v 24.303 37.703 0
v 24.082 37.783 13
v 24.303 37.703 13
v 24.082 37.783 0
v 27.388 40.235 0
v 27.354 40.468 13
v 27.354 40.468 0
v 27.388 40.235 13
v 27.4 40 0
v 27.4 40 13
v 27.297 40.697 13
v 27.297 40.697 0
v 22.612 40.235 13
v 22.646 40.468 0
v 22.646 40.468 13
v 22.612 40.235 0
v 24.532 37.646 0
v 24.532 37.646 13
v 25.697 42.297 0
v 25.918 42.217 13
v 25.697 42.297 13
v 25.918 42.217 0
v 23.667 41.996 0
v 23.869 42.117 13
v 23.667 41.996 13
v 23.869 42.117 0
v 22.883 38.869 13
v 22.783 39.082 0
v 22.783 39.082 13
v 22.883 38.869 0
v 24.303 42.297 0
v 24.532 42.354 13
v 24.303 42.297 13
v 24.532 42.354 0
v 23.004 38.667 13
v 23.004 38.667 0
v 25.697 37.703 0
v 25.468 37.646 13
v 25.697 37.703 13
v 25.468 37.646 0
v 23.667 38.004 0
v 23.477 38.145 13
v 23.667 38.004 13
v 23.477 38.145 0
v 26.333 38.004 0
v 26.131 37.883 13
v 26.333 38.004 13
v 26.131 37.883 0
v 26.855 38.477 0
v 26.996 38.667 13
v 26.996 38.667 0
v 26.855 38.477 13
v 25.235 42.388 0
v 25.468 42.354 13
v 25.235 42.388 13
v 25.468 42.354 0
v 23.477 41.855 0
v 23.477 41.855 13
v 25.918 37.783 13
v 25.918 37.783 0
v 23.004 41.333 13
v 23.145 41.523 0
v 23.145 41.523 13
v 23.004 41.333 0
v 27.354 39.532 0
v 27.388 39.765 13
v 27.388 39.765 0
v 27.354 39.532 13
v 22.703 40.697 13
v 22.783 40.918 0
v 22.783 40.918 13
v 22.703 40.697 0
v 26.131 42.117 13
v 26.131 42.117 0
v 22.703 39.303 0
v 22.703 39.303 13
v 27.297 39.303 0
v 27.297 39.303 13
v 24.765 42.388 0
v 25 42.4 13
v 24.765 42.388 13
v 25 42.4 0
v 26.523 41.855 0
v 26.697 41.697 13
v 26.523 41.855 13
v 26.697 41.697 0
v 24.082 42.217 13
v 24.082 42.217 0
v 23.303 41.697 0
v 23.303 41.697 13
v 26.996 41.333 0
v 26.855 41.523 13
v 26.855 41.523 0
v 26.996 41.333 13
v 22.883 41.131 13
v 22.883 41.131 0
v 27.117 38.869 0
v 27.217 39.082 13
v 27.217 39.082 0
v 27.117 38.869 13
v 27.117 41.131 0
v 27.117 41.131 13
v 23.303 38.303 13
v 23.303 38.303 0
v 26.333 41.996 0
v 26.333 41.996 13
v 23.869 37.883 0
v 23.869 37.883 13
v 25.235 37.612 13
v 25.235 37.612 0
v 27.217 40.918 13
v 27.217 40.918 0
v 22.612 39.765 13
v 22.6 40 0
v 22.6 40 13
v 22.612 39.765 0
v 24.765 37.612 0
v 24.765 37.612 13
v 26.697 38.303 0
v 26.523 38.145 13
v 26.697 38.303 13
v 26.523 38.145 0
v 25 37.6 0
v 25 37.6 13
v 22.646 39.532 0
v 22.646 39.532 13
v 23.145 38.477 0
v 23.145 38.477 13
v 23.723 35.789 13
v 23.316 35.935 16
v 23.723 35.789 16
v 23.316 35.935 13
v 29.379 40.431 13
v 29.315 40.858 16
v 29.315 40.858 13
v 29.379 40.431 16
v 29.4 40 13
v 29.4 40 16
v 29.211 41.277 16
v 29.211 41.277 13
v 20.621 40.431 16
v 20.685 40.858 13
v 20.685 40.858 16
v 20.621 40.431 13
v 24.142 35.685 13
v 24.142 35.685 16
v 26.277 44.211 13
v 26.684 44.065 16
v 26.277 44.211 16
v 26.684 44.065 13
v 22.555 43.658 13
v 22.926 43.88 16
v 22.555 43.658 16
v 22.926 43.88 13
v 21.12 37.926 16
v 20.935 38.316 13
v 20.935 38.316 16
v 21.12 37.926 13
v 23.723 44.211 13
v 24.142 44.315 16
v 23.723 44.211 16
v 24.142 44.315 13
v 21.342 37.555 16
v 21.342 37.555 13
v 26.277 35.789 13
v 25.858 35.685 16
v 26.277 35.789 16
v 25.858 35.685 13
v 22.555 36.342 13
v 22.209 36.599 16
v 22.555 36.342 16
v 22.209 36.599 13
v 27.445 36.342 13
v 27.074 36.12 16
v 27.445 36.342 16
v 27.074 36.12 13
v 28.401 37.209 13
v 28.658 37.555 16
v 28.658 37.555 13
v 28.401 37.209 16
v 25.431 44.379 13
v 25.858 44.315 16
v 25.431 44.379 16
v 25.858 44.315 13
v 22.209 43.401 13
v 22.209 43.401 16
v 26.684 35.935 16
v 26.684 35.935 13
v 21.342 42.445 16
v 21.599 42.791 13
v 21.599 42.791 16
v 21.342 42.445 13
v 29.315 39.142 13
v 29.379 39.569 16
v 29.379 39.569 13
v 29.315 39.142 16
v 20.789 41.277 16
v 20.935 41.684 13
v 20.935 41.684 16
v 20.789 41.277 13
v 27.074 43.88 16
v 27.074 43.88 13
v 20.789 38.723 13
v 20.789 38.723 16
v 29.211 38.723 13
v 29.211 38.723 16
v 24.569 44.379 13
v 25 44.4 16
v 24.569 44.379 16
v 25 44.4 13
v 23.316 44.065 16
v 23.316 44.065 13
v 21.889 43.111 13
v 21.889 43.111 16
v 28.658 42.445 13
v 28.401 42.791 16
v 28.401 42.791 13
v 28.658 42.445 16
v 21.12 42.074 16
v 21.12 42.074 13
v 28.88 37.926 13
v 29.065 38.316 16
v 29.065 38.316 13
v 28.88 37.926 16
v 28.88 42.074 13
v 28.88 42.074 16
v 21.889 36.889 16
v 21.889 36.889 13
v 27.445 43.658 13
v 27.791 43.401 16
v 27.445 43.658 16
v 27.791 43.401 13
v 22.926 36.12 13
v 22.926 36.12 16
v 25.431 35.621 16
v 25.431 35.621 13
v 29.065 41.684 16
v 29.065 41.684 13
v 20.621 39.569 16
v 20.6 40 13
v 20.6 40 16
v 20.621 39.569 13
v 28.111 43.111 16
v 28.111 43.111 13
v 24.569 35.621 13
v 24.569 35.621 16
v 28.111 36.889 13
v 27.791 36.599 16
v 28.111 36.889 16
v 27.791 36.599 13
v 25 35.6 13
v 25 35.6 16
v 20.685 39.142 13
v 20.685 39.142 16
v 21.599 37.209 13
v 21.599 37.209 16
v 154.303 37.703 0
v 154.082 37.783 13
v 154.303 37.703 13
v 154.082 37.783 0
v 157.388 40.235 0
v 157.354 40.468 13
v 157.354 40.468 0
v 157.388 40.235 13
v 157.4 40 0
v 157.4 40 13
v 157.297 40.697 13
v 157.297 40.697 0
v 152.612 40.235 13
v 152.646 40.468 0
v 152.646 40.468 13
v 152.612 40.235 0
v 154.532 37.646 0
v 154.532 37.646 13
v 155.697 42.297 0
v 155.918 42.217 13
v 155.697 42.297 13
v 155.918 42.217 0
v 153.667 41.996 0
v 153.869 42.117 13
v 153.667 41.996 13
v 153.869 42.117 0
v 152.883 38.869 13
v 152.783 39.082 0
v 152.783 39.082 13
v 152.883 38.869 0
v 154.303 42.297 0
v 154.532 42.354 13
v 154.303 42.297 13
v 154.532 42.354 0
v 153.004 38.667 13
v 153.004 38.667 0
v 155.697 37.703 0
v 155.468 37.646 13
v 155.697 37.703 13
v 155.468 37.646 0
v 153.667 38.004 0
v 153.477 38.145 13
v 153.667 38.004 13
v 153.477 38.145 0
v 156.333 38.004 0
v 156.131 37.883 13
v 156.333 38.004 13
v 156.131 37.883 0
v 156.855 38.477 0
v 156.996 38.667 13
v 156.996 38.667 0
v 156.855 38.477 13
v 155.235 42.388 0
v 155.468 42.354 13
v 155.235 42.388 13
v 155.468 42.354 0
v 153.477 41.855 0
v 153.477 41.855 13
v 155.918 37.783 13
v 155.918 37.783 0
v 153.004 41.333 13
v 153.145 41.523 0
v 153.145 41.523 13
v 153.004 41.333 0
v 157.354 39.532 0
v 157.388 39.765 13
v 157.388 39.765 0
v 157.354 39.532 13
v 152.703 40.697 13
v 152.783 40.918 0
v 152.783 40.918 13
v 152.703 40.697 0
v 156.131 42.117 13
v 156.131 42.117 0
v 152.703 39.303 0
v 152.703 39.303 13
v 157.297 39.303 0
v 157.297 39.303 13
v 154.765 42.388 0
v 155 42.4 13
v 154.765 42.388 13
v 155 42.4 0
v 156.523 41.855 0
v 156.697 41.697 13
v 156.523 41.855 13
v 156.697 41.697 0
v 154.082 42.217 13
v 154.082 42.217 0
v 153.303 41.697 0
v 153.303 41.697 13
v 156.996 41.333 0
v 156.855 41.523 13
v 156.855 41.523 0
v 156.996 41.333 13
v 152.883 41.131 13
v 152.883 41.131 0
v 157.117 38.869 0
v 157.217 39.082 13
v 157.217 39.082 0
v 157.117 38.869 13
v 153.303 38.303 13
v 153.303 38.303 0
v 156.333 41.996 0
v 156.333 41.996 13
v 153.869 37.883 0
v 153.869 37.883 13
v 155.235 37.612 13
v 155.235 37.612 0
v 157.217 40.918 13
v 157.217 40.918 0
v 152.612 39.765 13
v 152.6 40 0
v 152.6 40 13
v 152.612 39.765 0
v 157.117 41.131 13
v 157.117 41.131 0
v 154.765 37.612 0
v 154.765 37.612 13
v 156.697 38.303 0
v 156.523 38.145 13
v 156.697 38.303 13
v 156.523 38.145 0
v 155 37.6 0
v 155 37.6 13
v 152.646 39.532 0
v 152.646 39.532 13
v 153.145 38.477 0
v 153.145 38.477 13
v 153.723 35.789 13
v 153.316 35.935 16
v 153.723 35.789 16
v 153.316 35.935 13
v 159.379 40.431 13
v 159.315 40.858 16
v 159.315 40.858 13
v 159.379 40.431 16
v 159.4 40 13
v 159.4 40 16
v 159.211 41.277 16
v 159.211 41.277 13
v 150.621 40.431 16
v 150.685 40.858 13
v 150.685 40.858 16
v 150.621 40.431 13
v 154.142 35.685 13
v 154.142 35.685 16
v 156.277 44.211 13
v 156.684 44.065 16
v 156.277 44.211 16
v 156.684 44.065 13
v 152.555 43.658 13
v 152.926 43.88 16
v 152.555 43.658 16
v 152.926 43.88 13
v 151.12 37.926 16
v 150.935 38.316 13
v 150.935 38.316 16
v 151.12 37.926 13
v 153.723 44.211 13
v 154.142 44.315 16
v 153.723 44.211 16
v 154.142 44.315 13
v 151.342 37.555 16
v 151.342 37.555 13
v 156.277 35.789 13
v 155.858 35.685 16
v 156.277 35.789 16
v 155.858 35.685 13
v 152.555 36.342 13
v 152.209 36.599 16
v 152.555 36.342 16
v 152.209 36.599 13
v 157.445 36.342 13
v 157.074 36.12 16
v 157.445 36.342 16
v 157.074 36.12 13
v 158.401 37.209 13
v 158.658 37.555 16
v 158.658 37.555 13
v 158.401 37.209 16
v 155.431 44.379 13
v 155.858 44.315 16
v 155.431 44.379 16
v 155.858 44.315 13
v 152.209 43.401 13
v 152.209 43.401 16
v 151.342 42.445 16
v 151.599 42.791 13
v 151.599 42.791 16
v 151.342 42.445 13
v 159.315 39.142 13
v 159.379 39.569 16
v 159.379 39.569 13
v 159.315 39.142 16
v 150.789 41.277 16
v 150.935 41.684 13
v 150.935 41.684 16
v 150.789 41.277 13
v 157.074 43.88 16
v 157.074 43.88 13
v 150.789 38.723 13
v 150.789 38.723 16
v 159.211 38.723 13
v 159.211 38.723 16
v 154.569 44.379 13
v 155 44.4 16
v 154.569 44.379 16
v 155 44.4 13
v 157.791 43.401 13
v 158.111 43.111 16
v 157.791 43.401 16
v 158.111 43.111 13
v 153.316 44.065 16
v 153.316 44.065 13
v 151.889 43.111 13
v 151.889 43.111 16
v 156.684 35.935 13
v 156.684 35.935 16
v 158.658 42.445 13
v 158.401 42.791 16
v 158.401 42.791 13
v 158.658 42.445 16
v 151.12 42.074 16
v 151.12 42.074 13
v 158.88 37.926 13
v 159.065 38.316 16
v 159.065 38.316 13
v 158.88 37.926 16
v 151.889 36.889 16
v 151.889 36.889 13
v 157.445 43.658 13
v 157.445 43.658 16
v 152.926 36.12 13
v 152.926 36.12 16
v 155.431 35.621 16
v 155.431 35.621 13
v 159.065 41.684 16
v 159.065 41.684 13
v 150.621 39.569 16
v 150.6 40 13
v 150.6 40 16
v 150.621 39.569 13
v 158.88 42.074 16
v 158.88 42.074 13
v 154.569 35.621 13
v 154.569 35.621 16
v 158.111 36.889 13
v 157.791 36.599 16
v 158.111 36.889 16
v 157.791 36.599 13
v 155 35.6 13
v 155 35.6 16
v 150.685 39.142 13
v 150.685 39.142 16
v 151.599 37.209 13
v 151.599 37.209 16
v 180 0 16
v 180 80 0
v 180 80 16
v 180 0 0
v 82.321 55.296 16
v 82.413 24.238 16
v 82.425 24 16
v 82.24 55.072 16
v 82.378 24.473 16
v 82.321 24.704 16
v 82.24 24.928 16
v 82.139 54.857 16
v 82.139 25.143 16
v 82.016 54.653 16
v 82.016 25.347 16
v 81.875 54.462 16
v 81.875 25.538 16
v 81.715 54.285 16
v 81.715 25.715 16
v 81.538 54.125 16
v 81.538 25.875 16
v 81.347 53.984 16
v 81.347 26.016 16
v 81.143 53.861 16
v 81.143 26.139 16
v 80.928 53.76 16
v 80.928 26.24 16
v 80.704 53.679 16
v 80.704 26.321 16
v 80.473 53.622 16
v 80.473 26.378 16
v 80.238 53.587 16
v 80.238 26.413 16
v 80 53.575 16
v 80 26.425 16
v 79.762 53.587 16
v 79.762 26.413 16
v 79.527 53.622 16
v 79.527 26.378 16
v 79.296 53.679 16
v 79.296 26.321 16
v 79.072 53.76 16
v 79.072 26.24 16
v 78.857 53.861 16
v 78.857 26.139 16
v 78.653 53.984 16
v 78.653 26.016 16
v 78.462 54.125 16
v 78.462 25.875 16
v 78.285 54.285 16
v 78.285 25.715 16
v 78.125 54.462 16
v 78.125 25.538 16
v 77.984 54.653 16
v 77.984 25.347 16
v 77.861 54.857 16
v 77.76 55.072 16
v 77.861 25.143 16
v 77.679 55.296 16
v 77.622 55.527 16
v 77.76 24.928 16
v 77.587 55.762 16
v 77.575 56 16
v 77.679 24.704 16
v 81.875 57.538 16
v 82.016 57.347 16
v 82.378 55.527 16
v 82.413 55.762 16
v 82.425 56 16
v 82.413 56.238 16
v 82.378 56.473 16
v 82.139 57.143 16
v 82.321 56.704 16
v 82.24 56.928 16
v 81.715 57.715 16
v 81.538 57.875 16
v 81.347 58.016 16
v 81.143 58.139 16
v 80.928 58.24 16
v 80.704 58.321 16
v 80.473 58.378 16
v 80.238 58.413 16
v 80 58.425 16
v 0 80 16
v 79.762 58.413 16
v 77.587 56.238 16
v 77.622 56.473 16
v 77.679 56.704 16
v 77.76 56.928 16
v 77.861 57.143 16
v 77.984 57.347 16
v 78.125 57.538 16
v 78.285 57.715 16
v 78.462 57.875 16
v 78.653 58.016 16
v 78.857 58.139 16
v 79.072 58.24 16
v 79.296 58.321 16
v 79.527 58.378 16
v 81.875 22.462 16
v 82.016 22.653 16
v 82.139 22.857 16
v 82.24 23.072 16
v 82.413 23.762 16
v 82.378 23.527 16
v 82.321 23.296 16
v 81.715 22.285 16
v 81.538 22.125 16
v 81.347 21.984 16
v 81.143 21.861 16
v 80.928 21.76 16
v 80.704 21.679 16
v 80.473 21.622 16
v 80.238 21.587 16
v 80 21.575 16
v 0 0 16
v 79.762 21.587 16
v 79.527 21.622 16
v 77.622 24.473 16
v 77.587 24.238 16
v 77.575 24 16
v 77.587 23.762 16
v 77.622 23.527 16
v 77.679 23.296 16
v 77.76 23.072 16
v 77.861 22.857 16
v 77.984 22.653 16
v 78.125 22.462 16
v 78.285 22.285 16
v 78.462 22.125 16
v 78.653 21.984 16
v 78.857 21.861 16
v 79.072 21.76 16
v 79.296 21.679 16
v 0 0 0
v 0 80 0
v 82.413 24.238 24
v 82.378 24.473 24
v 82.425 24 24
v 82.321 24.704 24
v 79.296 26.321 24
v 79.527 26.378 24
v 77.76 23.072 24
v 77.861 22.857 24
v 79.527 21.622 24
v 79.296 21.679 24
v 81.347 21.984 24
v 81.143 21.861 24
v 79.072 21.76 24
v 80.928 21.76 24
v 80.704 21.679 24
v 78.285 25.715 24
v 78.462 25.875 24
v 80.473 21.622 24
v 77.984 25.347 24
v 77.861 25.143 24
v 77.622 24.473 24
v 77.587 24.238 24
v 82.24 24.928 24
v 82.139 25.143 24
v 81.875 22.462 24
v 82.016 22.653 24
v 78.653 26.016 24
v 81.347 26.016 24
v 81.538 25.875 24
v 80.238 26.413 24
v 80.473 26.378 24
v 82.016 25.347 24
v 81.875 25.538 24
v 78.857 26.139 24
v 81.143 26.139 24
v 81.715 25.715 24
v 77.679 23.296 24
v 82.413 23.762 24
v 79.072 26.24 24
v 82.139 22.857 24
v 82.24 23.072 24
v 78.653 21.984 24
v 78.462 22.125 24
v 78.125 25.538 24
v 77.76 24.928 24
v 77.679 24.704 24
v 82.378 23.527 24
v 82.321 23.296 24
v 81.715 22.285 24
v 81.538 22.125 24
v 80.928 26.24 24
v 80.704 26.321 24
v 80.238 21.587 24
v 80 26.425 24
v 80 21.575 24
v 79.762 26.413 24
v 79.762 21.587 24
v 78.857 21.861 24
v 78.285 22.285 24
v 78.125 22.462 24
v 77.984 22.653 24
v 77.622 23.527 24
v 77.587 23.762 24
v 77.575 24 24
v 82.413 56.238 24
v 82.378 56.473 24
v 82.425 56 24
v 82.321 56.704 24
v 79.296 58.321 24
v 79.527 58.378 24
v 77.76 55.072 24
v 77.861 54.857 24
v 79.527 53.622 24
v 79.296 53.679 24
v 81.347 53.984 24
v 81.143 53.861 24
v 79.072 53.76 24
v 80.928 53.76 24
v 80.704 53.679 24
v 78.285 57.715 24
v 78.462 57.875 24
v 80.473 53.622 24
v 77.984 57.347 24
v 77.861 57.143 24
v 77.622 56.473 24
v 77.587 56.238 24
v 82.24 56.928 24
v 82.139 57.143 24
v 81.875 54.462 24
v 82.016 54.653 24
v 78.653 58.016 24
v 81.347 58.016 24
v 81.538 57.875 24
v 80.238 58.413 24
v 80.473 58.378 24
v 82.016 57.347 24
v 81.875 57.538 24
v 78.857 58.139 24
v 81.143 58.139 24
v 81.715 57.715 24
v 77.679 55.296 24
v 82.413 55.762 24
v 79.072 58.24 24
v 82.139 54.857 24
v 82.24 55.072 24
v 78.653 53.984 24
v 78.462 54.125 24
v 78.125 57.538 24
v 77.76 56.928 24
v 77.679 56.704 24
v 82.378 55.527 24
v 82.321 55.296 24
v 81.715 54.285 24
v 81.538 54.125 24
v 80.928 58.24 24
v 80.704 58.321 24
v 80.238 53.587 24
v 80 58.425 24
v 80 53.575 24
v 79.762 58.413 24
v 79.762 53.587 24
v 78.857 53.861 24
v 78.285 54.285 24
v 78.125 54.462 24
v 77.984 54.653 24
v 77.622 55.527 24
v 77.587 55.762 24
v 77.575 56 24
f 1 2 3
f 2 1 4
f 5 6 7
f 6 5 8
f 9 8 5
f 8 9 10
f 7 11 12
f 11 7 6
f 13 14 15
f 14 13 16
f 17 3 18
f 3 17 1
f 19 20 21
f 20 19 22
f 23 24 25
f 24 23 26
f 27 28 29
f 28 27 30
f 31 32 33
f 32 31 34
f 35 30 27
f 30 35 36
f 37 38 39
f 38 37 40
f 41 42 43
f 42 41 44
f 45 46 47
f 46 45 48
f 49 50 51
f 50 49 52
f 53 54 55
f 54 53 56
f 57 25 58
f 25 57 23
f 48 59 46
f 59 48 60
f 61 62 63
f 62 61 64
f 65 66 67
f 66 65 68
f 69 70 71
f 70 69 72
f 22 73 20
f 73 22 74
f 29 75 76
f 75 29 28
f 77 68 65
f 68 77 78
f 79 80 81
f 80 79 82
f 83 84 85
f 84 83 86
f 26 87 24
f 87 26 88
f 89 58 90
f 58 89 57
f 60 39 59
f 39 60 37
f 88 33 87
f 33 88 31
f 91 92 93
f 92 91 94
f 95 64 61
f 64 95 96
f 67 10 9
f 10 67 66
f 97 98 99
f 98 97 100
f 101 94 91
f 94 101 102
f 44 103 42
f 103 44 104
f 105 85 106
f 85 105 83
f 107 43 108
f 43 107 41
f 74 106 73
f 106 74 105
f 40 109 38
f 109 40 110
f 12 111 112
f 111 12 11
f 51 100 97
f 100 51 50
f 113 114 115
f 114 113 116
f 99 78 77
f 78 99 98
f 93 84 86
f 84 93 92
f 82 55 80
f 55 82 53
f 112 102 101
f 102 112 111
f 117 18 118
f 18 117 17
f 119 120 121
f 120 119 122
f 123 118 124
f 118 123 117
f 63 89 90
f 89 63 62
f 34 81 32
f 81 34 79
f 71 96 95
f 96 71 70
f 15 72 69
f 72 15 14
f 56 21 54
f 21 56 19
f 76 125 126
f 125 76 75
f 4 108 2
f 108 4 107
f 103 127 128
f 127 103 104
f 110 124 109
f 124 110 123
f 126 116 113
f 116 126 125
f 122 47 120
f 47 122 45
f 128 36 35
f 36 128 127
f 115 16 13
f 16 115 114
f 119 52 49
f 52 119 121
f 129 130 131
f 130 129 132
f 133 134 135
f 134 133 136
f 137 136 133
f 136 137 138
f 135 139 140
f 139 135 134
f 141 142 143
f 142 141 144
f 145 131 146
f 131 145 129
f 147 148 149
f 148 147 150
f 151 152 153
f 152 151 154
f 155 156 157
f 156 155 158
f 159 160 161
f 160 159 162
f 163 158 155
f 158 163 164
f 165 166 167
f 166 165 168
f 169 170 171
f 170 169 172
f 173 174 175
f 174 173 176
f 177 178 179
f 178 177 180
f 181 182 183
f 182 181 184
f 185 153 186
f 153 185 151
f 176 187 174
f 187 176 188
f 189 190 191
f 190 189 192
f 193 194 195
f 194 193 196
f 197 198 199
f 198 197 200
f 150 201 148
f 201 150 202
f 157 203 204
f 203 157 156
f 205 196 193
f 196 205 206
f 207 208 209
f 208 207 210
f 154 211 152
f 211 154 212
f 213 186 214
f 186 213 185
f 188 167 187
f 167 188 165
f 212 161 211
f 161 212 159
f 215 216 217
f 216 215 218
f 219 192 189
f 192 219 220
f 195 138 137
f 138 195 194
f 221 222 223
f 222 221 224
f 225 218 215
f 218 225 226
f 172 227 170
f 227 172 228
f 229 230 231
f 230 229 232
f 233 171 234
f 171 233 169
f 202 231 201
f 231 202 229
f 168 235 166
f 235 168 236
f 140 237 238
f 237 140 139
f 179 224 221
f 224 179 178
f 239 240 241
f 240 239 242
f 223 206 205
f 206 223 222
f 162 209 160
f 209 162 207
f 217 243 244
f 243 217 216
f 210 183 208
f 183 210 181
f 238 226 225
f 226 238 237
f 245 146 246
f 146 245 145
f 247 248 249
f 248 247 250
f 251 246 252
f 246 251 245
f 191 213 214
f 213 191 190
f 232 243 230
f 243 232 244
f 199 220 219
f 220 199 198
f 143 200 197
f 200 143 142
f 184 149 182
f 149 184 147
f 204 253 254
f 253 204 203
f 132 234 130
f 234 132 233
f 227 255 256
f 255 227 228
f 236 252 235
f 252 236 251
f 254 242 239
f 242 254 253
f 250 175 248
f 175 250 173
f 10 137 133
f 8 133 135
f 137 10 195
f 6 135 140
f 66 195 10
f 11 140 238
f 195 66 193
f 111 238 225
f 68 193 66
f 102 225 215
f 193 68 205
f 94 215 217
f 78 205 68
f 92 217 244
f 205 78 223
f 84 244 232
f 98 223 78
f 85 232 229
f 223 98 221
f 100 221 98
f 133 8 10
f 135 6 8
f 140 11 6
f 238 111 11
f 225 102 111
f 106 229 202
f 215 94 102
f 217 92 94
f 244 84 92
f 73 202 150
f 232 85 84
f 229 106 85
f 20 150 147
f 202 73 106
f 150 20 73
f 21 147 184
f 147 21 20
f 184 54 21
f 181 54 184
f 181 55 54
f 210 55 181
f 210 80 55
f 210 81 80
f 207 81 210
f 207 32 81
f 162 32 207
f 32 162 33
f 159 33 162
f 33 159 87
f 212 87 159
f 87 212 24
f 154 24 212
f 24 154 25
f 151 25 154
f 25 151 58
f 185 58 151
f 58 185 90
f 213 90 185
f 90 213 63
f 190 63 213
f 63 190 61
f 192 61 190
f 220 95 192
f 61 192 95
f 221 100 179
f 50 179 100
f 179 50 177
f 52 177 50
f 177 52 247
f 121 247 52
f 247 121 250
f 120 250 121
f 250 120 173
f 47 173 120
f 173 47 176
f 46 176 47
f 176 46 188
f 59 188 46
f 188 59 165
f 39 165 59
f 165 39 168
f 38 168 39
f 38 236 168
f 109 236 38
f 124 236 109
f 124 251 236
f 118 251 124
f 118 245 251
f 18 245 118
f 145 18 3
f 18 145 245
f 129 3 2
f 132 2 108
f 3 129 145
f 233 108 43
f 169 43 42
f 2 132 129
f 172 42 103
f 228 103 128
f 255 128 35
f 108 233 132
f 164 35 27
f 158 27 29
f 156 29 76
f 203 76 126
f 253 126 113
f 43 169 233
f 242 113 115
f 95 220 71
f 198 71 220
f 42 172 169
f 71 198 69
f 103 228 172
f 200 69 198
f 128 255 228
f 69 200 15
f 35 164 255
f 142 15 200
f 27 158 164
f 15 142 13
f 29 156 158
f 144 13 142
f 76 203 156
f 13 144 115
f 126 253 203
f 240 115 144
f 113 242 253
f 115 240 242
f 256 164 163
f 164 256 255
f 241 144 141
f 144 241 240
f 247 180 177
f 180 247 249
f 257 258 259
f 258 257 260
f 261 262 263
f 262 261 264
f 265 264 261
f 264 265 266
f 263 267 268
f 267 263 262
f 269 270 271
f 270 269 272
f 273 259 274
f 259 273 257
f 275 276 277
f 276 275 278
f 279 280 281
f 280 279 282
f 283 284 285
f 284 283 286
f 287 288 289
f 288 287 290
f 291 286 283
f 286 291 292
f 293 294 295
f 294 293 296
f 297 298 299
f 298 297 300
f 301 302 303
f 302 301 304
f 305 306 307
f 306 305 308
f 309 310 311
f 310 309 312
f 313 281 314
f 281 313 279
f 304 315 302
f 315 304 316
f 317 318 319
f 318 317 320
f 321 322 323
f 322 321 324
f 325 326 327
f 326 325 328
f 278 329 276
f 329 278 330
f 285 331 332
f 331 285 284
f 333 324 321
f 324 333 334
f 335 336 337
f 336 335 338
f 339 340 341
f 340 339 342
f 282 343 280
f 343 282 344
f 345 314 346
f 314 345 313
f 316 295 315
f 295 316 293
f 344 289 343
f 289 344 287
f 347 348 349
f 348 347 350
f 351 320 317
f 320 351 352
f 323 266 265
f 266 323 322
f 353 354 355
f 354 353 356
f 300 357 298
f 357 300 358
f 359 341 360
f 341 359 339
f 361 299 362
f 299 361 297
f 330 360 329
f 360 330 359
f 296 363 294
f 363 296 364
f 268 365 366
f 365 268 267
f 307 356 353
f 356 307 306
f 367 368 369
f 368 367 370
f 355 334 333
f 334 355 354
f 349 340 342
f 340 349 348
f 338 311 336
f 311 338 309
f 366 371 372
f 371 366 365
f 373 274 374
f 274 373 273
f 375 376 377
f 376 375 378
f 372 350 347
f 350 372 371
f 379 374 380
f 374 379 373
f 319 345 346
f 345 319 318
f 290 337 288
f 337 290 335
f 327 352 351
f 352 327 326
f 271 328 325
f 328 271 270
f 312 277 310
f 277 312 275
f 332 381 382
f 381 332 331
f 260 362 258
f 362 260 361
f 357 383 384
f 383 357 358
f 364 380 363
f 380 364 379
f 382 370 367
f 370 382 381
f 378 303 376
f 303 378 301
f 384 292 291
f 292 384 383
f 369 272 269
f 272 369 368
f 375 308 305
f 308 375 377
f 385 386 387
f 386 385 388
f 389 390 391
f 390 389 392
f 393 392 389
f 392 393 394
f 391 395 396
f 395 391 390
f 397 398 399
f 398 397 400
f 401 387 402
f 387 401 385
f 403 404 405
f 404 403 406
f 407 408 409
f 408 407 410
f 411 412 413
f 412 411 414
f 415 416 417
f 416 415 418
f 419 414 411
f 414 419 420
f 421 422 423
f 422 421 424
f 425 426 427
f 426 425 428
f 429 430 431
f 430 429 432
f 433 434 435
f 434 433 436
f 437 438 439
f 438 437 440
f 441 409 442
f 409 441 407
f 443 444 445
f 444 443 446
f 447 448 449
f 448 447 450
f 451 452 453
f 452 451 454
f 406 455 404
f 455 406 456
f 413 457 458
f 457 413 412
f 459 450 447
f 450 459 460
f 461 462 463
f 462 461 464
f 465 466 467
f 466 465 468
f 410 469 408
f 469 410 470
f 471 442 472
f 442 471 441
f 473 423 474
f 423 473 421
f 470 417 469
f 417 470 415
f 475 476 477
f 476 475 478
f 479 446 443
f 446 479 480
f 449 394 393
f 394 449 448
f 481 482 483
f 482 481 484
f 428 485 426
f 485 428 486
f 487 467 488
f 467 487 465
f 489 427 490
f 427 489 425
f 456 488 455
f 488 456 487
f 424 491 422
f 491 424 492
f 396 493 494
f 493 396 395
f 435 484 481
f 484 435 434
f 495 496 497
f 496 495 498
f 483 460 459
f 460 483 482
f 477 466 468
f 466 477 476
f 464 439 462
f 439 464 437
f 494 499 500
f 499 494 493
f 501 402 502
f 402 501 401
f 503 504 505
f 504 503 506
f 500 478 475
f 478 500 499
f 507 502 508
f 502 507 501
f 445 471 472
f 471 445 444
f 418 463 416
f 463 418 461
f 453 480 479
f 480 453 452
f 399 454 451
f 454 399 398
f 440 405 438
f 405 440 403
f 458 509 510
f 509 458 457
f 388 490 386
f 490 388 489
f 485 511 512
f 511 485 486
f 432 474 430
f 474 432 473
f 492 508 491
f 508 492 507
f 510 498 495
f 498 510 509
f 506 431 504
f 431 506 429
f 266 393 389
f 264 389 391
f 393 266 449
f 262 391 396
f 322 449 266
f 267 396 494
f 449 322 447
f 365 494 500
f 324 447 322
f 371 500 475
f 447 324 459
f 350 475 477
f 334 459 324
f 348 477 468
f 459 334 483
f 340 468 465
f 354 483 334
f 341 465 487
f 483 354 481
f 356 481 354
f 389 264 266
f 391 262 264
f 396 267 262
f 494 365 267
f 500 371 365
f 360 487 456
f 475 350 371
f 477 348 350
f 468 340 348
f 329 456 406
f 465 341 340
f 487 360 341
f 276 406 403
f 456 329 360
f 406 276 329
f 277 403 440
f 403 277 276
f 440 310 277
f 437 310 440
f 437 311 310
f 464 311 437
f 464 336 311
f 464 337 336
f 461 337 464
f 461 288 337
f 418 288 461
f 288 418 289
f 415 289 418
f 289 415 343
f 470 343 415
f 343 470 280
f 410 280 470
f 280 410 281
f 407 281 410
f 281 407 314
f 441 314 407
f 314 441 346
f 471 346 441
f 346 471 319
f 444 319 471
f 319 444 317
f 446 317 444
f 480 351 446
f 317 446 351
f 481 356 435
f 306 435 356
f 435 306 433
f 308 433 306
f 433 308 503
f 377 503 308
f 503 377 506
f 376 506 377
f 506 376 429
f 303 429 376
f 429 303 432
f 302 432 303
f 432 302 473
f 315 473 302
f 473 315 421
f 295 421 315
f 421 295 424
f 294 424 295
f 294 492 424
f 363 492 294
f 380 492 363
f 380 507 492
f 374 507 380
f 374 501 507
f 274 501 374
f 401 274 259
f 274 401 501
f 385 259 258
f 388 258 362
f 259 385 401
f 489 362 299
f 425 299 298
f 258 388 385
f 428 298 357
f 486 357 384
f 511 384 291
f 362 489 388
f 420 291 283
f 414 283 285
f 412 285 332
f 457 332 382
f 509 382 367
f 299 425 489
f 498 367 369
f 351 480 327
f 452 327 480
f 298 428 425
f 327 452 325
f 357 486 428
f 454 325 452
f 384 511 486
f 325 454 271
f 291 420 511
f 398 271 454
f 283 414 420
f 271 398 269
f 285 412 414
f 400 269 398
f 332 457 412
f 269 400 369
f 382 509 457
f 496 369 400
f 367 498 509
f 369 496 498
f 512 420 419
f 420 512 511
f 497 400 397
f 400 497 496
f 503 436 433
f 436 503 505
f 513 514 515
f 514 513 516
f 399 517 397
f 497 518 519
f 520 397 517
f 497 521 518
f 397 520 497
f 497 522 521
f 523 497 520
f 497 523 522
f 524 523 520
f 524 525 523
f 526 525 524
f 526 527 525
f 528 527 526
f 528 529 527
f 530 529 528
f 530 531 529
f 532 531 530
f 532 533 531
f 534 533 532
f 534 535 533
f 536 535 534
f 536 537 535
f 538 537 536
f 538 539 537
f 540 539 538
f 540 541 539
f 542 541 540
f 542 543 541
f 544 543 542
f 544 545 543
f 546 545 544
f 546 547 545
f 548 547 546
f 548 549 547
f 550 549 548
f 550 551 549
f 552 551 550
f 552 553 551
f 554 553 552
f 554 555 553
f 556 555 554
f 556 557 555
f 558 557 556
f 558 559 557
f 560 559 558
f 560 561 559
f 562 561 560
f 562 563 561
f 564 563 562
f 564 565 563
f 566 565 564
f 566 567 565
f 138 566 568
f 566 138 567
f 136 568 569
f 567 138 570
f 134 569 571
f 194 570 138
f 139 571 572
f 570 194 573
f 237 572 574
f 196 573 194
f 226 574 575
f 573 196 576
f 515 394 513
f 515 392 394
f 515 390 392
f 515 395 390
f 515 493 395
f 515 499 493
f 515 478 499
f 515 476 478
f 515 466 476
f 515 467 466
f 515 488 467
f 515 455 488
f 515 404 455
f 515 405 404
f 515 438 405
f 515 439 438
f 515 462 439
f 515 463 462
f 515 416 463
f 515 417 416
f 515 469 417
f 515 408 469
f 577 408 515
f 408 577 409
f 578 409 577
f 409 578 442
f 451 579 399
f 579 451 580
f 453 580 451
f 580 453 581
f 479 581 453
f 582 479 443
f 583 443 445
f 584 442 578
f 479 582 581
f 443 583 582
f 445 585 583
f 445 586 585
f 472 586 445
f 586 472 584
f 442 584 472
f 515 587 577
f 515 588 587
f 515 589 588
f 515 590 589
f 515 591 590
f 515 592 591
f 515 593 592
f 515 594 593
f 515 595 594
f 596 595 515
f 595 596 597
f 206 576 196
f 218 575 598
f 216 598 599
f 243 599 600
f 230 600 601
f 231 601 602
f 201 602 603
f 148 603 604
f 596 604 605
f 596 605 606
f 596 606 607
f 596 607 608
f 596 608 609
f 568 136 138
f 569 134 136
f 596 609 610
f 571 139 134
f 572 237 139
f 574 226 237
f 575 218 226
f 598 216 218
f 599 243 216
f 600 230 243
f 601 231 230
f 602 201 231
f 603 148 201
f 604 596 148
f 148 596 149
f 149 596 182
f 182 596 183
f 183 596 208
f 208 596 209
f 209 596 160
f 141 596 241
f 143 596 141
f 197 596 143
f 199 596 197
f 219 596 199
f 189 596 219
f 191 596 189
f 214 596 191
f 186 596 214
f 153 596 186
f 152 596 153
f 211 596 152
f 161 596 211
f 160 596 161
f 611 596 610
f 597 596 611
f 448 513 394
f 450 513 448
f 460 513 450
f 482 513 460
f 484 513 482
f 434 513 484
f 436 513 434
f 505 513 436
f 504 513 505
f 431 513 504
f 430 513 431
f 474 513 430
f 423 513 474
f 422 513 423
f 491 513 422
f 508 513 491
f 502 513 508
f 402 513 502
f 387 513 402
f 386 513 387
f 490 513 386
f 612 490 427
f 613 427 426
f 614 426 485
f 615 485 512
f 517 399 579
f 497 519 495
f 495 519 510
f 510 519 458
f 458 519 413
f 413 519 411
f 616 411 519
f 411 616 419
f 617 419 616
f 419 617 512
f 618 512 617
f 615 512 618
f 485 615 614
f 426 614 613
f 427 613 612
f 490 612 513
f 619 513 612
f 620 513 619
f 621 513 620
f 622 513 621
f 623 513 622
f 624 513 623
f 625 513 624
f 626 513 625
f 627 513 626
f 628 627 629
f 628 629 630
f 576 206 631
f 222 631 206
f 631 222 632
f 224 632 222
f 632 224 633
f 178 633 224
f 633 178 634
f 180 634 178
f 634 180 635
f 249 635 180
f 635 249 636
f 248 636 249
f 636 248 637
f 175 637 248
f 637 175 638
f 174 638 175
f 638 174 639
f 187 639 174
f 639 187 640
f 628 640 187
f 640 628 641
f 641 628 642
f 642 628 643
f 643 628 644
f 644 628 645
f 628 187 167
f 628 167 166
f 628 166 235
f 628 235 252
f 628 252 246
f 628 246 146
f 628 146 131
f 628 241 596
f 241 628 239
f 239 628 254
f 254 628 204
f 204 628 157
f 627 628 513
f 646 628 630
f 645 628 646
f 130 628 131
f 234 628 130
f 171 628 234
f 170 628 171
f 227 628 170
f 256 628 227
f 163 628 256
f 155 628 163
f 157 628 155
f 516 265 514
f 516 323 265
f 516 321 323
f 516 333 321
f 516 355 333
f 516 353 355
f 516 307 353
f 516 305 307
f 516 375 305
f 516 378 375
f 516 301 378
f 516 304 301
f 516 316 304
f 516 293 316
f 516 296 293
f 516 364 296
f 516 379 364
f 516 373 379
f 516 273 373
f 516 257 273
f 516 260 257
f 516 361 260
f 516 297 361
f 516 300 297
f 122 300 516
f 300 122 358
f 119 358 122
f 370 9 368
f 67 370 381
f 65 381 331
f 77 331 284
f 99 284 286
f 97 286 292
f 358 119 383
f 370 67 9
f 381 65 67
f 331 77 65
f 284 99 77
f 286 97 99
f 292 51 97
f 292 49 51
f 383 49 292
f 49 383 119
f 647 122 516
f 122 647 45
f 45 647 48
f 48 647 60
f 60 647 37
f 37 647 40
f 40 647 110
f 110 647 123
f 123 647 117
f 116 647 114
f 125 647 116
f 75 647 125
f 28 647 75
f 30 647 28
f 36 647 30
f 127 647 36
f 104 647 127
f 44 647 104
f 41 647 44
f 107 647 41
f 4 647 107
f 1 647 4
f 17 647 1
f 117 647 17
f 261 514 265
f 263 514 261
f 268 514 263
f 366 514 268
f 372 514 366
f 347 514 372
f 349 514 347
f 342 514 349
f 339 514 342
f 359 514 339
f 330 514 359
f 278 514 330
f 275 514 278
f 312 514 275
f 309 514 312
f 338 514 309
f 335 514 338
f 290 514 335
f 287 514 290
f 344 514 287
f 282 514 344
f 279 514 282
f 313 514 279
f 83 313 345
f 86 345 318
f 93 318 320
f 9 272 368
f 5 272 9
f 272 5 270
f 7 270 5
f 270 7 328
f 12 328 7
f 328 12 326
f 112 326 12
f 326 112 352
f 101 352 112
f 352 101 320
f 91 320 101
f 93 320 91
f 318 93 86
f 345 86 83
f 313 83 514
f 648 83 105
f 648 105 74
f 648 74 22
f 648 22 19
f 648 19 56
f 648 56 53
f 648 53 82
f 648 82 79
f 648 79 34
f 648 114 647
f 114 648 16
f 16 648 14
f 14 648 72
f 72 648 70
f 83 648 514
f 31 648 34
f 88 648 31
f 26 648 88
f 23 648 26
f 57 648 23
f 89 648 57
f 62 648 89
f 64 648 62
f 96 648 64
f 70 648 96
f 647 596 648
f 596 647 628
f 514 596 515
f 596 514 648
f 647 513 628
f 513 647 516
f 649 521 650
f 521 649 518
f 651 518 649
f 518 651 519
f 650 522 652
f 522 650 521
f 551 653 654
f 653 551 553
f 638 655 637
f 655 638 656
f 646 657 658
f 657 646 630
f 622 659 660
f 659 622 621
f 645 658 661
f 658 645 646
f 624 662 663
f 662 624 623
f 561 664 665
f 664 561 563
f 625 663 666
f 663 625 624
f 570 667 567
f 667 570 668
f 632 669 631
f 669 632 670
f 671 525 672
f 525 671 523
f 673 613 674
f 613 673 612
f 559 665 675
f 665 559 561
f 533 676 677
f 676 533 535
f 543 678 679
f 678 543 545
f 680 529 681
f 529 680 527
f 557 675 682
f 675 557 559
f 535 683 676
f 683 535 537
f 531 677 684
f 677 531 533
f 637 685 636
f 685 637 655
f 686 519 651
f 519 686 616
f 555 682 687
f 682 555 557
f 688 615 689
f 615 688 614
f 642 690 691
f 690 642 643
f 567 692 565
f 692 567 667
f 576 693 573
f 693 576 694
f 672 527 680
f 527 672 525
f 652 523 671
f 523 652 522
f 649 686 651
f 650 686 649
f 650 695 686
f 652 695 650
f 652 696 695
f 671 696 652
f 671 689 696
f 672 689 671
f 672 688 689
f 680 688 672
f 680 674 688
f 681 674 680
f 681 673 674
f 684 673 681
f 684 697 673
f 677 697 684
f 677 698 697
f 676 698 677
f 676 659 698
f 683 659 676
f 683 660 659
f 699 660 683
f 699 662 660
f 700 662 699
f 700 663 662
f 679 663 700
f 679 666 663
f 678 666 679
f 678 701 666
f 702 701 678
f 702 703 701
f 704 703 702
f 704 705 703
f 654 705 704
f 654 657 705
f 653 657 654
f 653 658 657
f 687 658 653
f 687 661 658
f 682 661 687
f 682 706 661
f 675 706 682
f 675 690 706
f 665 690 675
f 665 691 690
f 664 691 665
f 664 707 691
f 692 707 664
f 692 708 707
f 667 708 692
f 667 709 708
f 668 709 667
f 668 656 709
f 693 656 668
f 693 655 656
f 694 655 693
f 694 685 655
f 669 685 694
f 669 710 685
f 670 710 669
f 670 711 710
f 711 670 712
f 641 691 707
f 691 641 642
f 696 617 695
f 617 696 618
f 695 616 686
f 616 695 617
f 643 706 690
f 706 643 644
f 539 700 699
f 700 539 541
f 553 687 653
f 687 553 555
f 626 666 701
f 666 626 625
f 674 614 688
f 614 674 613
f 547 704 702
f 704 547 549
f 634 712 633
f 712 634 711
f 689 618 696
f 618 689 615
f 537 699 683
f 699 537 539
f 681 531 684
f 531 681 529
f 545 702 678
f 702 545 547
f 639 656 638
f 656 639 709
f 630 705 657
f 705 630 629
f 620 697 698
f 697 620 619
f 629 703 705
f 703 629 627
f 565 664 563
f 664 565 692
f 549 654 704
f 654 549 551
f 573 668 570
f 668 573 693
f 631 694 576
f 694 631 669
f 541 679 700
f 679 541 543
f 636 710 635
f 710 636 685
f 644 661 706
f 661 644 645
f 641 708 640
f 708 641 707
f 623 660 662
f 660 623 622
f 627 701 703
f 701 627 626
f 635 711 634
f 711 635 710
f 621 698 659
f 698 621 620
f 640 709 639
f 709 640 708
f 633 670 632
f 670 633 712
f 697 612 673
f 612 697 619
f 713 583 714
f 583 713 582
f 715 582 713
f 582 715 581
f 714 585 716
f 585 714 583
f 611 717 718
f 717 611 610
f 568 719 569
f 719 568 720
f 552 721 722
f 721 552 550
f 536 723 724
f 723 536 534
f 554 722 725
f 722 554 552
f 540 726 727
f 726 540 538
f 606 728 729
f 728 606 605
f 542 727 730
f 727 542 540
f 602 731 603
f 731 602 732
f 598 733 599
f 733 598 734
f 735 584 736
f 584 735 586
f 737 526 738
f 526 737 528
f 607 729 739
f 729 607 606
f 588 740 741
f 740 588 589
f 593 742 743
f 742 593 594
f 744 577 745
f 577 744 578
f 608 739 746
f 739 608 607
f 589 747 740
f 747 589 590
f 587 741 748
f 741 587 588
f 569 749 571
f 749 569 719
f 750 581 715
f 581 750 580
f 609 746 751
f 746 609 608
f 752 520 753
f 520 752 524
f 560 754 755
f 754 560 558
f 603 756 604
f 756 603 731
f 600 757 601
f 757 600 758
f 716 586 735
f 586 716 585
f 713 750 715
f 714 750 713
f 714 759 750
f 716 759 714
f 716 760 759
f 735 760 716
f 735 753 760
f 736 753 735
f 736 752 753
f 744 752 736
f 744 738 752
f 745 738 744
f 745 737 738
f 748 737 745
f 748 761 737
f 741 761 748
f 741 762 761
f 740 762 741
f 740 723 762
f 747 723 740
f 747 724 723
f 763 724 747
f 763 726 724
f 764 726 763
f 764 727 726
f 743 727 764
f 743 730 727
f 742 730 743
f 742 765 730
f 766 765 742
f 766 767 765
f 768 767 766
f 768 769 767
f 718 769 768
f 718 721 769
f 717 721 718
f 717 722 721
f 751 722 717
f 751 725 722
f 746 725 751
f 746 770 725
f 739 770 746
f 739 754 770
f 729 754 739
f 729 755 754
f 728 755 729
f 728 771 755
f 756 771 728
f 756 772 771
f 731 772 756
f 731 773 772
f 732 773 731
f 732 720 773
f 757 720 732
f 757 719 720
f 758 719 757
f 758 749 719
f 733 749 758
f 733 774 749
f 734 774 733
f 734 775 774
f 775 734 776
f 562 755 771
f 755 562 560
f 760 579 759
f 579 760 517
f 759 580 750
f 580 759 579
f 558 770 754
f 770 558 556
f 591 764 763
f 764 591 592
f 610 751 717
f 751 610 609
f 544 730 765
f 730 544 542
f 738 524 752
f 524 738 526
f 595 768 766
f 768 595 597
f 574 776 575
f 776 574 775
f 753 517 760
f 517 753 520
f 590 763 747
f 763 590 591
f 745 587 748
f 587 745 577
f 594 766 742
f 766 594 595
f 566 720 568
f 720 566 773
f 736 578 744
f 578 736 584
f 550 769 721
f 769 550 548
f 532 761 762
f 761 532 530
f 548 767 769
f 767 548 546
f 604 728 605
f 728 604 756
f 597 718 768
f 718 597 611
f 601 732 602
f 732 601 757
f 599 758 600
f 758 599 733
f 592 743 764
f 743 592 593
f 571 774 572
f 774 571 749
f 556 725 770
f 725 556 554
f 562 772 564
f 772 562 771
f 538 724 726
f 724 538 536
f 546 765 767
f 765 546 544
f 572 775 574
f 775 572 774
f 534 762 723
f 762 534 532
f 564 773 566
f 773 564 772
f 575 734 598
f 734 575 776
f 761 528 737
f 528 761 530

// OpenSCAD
// project_stem: example_multi_part
// version: v01
// units: millimeters
// orientation: Z+ is up
// printer_name: Bambu Lab P2S
// material: PETG
// print_orientation: each split part uses largest flat face on bed
// support_notes: update before export
// brim_notes: update before export

$fn = 64;

// -------------------------
// Parameters
// -------------------------
project_stem = "example_multi_part";
version = "v01";
printer_name = "Bambu Lab P2S";
material = "PETG";

clearance_profile = "normal_slip";
loose_clearance = 0.5;
normal_clearance = 0.3;
tight_clearance = 0.15;
fit_clearance = normal_clearance;

overall_width = 180;
overall_depth = 80;
overall_height = 16;
wall_thickness = 3.2;

screw_diameter = 4.5;
screw_head_diameter = 8.5;
screw_head_depth = 3;
use_countersink = false;
use_counterbore = true;

rib_thickness = 2.4;
rib_height = 12;

export_part = "all"; // all, left, right
split_part = "left_right";

// -------------------------
// Helper Modules
// -------------------------
module screw_clearance_hole(height) {
    cylinder(h = height, d = screw_diameter + fit_clearance);
}

module counterbore(depth) {
    if (use_counterbore)
        cylinder(h = depth, d = screw_head_diameter + fit_clearance);
}

module alignment_pin() {
    cylinder(h = 8, d = 5 - tight_clearance);
}

module alignment_socket() {
    cylinder(h = 9, d = 5 + normal_clearance);
}

module reinforcement_rib(length) {
    linear_extrude(height = rib_thickness)
        polygon(points = [[0, 0], [length, 0], [0, rib_height]]);
}

// -------------------------
// Body Modules
// -------------------------
module base_body() {
    difference() {
        cube([overall_width, overall_depth, overall_height]);
        for (x_pos = [25, overall_width - 25]) {
            translate([x_pos, overall_depth / 2, -1])
                screw_clearance_hole(overall_height + 2);
            translate([x_pos, overall_depth / 2, overall_height - screw_head_depth])
                counterbore(screw_head_depth + 1);
        }
    }
}

module split_volume_left() {
    intersection() {
        base_body();
        translate([-1, -1, -1])
            cube([overall_width / 2 + 1, overall_depth + 2, overall_height + 2]);
    }
}

module split_volume_right() {
    intersection() {
        base_body();
        translate([overall_width / 2, -1, -1])
            cube([overall_width / 2 + 1, overall_depth + 2, overall_height + 2]);
    }
}

module left_part() {
    union() {
        split_volume_left();
        translate([overall_width / 2 - 10, overall_depth * 0.3, overall_height])
            alignment_pin();
        translate([overall_width / 2 - 10, overall_depth * 0.7, overall_height])
            alignment_pin();
    }
}

module right_part() {
    difference() {
        split_volume_right();
        translate([overall_width / 2 - 10, overall_depth * 0.3, overall_height - 1])
            alignment_socket();
        translate([overall_width / 2 - 10, overall_depth * 0.7, overall_height - 1])
            alignment_socket();
    }
}

// -------------------------
// Final Render
// -------------------------
module final_render() {
    if (export_part == "left") {
        left_part();
    } else if (export_part == "right") {
        right_part();
    } else {
        union() {
            left_part();
            right_part();
        }
    }
}

final_render();
